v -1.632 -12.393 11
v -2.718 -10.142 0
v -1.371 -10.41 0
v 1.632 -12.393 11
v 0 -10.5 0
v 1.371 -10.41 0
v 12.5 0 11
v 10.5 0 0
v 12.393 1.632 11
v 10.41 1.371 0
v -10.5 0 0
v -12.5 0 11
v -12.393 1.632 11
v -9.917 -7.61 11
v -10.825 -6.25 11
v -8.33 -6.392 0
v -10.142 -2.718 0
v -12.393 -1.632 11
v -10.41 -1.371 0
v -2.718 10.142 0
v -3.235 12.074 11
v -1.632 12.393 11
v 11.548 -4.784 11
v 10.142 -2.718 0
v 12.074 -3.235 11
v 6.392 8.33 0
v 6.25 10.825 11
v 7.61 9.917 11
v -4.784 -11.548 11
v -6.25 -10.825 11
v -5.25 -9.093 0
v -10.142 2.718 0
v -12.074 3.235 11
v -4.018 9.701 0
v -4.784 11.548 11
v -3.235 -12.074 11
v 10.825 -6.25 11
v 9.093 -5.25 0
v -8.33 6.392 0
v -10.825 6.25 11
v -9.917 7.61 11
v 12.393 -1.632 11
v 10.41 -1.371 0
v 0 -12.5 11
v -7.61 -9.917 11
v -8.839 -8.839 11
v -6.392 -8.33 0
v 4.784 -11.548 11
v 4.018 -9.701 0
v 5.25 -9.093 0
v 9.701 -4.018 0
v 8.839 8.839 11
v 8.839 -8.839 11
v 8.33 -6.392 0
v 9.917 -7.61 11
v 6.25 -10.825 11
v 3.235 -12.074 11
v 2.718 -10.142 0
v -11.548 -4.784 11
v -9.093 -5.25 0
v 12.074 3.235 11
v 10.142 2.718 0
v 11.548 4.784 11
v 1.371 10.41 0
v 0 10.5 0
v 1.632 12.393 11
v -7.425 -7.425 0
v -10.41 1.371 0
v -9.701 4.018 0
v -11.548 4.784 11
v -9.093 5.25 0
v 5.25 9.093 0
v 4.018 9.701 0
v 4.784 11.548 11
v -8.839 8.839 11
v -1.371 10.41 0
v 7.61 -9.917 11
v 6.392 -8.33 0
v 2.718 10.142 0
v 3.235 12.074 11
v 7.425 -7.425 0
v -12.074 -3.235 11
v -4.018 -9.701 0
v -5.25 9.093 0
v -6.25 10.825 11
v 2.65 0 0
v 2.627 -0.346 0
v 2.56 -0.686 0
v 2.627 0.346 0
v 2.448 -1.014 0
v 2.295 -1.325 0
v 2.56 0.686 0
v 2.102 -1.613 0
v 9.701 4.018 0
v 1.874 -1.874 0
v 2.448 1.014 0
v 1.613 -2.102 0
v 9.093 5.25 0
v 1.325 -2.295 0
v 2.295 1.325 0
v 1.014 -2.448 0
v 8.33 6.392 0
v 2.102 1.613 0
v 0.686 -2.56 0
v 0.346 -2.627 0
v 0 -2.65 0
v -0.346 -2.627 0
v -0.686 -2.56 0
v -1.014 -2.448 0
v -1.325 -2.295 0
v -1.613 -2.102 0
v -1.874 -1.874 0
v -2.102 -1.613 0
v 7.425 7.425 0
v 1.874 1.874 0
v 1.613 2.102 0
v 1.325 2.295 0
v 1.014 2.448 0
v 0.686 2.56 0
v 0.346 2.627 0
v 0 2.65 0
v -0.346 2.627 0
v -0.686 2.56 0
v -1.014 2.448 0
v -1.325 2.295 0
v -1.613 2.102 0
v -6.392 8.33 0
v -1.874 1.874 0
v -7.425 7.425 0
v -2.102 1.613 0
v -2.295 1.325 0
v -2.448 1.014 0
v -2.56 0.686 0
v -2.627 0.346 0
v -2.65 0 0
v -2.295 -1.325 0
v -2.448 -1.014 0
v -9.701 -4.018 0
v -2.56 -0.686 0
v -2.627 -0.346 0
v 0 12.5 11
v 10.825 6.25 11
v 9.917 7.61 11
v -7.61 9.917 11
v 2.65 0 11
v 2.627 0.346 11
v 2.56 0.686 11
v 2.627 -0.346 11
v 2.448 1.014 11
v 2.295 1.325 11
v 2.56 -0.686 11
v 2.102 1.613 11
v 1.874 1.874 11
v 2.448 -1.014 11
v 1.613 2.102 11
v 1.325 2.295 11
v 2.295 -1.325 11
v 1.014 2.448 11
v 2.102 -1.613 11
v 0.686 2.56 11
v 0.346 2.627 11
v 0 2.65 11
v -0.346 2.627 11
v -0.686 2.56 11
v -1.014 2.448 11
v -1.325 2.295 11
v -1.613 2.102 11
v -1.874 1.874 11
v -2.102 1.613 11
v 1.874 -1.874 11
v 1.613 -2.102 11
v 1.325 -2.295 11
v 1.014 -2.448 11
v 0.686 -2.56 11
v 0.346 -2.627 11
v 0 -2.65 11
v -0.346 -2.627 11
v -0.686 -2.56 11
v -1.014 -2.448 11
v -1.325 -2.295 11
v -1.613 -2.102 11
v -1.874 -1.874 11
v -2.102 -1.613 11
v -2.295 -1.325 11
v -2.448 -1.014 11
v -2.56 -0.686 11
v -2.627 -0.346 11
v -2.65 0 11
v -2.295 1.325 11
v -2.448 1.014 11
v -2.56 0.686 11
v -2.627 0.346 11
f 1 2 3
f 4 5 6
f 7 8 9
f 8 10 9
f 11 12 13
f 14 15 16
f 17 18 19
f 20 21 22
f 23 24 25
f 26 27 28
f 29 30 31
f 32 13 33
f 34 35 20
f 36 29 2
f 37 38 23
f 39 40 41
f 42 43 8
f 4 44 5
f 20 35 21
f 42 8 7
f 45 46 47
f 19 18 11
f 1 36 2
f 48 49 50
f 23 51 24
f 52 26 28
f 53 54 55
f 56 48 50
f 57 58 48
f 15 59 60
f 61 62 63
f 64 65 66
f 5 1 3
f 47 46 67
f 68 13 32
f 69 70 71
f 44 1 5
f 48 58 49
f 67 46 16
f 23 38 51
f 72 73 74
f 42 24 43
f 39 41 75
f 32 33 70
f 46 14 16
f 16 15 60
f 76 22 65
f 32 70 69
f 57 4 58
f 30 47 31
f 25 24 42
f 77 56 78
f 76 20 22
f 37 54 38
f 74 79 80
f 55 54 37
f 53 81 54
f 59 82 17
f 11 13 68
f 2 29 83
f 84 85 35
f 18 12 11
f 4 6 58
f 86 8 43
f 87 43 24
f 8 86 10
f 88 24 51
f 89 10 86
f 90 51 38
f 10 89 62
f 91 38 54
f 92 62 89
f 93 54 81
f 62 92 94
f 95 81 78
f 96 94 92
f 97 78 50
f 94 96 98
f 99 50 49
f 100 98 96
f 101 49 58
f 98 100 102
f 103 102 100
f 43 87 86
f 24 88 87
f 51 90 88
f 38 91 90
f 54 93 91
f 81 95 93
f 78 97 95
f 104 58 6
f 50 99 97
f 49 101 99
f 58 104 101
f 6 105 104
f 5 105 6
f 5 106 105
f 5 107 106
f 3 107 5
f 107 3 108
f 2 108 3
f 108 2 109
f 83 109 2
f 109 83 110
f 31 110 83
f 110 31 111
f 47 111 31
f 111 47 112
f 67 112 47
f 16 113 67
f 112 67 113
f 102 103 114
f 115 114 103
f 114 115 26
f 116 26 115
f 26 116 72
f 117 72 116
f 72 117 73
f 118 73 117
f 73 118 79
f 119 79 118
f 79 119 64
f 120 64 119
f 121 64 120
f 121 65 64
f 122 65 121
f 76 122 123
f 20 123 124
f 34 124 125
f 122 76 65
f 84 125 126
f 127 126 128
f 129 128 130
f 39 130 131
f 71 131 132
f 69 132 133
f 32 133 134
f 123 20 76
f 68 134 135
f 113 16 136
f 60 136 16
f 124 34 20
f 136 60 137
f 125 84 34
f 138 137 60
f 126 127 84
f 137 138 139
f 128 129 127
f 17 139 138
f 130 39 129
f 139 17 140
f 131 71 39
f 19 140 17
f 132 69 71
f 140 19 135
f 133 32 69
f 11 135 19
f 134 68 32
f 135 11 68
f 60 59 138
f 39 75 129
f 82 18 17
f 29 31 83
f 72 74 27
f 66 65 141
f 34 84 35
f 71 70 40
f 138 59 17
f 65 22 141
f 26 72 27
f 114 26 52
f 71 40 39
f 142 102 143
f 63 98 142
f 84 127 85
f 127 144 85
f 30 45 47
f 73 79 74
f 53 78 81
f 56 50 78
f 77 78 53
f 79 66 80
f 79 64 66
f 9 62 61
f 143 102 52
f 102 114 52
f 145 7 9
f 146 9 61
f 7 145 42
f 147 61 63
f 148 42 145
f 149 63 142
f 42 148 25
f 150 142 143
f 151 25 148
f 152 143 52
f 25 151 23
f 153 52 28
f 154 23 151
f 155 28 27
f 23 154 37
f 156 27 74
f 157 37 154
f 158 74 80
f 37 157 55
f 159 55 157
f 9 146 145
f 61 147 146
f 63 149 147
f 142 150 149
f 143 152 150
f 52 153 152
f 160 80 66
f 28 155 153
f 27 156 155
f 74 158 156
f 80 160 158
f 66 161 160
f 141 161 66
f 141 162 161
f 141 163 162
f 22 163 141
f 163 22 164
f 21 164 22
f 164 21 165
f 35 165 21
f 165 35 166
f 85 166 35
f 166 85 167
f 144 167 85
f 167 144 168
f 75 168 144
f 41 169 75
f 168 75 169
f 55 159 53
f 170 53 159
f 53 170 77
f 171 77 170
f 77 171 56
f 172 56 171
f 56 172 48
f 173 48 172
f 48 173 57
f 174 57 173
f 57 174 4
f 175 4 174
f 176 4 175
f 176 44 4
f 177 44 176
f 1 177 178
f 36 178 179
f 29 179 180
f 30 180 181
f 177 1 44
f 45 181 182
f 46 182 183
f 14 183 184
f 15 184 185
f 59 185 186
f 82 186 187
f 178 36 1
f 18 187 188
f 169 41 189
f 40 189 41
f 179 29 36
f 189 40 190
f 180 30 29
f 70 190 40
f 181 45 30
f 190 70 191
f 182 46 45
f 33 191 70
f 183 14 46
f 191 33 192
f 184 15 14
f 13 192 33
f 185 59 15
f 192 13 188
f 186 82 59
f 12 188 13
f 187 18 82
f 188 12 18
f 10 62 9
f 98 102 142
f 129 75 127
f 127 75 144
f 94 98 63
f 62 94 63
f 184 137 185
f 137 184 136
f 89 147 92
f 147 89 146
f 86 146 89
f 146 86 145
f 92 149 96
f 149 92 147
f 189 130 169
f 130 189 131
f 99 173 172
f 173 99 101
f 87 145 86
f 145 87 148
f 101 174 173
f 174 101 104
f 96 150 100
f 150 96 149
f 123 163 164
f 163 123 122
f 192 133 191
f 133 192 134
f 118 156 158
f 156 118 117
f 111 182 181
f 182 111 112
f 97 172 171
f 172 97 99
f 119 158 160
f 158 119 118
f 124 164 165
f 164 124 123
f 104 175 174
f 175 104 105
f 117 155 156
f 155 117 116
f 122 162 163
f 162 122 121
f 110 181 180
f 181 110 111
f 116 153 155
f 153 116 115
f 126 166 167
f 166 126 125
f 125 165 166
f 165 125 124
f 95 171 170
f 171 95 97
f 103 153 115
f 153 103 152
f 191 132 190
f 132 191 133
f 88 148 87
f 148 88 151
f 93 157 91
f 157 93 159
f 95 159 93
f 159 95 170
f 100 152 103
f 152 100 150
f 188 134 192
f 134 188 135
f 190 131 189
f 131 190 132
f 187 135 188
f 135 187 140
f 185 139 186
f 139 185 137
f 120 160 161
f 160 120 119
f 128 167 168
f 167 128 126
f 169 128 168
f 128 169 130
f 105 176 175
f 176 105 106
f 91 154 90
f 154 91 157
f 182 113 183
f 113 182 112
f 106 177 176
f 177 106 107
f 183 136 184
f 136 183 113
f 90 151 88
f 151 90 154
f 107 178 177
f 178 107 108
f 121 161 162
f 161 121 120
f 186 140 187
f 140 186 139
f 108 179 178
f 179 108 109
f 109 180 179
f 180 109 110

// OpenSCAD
// ============================================================================
// Rubber foot — Adam Hall 4900SM4AH (simplified)
//
// This file is fully independent from the legacy model library.
// The component is built around the local origin and can be opened directly.
//
// Local axes:
// X/Y = circular footprint
// Z   = from floor side toward the mounting surface
// ============================================================================

/* [Component view] */

component_selection = "component_1"; // [assembled,exploded,all_unique,component_1]
component_orientation = "model"; // [model,print]

/* [Rubber feet] */

show_steel_disc = true;

module rubber_foot(
    bottom_diameter=21,
    mounting_diameter=25,
    height=11,
    mounting_hole_diameter=5.3,
    steel_disc_diameter=18,
    steel_disc_thickness=0.8,
    show_steel_disc=true,
    rubber_color=[0.05,0.05,0.05],
    steel_color=[0.35,0.35,0.35],
    curve_segments=48
) {
    assert(bottom_diameter > 0,
        "bottom_diameter must be positive.");
    assert(mounting_diameter >= bottom_diameter,
        "mounting_diameter must not be smaller than bottom_diameter.");
    assert(height > steel_disc_thickness,
        "height must exceed steel_disc_thickness.");
    assert(mounting_hole_diameter > 0
        && mounting_hole_diameter < bottom_diameter,
        "mounting_hole_diameter must fit inside the rubber foot.");

    difference() {
        color(rubber_color)
            cylinder(
                d1=bottom_diameter,
                d2=mounting_diameter,
                h=height,
                $fn=curve_segments
            );

        translate([0,0,-0.2])
            cylinder(
                d=mounting_hole_diameter,
                h=height+0.4,
                $fn=curve_segments
            );
    }

    if(show_steel_disc)
        color(steel_color)
            translate([0,0,height-1])
                difference() {
                    cylinder(
                        d=steel_disc_diameter,
                        h=steel_disc_thickness,
                        $fn=curve_segments
                    );

                    translate([0,0,-0.1])
                        cylinder(
                            d=mounting_hole_diameter,
                            h=steel_disc_thickness+0.2,
                            $fn=curve_segments
                        );
                }
}

module rubber_feet_view(
    selection="component_1",
    orientation="model",
    show_steel_disc=true,
    spacing=40
) {
    assert(
        selection=="assembled"
        || selection=="exploded"
        || selection=="all_unique"
        || selection=="component_1",
        "Unknown rubber-foot component selection."
    );
    assert(
        orientation=="model" || orientation=="print",
        "orientation must be model or print."
    );

    module oriented_foot() {
        // The model orientation already has the flat floor side on Z=0 and is
        // also the preferred print orientation.
        rubber_foot(
            show_steel_disc=show_steel_disc
        );
    }

    if(selection=="component_1" || selection=="all_unique") {
        oriented_foot();

    } else {
        layout_spacing = selection=="exploded" ? spacing*1.5 : spacing;

        for(x=[-layout_spacing/2,layout_spacing/2])
            for(y=[-layout_spacing/2,layout_spacing/2])
                translate([x,y,0])
                    oriented_foot();
    }
}

rubber_feet_view(
    component_selection,
    component_orientation,
    show_steel_disc
);
